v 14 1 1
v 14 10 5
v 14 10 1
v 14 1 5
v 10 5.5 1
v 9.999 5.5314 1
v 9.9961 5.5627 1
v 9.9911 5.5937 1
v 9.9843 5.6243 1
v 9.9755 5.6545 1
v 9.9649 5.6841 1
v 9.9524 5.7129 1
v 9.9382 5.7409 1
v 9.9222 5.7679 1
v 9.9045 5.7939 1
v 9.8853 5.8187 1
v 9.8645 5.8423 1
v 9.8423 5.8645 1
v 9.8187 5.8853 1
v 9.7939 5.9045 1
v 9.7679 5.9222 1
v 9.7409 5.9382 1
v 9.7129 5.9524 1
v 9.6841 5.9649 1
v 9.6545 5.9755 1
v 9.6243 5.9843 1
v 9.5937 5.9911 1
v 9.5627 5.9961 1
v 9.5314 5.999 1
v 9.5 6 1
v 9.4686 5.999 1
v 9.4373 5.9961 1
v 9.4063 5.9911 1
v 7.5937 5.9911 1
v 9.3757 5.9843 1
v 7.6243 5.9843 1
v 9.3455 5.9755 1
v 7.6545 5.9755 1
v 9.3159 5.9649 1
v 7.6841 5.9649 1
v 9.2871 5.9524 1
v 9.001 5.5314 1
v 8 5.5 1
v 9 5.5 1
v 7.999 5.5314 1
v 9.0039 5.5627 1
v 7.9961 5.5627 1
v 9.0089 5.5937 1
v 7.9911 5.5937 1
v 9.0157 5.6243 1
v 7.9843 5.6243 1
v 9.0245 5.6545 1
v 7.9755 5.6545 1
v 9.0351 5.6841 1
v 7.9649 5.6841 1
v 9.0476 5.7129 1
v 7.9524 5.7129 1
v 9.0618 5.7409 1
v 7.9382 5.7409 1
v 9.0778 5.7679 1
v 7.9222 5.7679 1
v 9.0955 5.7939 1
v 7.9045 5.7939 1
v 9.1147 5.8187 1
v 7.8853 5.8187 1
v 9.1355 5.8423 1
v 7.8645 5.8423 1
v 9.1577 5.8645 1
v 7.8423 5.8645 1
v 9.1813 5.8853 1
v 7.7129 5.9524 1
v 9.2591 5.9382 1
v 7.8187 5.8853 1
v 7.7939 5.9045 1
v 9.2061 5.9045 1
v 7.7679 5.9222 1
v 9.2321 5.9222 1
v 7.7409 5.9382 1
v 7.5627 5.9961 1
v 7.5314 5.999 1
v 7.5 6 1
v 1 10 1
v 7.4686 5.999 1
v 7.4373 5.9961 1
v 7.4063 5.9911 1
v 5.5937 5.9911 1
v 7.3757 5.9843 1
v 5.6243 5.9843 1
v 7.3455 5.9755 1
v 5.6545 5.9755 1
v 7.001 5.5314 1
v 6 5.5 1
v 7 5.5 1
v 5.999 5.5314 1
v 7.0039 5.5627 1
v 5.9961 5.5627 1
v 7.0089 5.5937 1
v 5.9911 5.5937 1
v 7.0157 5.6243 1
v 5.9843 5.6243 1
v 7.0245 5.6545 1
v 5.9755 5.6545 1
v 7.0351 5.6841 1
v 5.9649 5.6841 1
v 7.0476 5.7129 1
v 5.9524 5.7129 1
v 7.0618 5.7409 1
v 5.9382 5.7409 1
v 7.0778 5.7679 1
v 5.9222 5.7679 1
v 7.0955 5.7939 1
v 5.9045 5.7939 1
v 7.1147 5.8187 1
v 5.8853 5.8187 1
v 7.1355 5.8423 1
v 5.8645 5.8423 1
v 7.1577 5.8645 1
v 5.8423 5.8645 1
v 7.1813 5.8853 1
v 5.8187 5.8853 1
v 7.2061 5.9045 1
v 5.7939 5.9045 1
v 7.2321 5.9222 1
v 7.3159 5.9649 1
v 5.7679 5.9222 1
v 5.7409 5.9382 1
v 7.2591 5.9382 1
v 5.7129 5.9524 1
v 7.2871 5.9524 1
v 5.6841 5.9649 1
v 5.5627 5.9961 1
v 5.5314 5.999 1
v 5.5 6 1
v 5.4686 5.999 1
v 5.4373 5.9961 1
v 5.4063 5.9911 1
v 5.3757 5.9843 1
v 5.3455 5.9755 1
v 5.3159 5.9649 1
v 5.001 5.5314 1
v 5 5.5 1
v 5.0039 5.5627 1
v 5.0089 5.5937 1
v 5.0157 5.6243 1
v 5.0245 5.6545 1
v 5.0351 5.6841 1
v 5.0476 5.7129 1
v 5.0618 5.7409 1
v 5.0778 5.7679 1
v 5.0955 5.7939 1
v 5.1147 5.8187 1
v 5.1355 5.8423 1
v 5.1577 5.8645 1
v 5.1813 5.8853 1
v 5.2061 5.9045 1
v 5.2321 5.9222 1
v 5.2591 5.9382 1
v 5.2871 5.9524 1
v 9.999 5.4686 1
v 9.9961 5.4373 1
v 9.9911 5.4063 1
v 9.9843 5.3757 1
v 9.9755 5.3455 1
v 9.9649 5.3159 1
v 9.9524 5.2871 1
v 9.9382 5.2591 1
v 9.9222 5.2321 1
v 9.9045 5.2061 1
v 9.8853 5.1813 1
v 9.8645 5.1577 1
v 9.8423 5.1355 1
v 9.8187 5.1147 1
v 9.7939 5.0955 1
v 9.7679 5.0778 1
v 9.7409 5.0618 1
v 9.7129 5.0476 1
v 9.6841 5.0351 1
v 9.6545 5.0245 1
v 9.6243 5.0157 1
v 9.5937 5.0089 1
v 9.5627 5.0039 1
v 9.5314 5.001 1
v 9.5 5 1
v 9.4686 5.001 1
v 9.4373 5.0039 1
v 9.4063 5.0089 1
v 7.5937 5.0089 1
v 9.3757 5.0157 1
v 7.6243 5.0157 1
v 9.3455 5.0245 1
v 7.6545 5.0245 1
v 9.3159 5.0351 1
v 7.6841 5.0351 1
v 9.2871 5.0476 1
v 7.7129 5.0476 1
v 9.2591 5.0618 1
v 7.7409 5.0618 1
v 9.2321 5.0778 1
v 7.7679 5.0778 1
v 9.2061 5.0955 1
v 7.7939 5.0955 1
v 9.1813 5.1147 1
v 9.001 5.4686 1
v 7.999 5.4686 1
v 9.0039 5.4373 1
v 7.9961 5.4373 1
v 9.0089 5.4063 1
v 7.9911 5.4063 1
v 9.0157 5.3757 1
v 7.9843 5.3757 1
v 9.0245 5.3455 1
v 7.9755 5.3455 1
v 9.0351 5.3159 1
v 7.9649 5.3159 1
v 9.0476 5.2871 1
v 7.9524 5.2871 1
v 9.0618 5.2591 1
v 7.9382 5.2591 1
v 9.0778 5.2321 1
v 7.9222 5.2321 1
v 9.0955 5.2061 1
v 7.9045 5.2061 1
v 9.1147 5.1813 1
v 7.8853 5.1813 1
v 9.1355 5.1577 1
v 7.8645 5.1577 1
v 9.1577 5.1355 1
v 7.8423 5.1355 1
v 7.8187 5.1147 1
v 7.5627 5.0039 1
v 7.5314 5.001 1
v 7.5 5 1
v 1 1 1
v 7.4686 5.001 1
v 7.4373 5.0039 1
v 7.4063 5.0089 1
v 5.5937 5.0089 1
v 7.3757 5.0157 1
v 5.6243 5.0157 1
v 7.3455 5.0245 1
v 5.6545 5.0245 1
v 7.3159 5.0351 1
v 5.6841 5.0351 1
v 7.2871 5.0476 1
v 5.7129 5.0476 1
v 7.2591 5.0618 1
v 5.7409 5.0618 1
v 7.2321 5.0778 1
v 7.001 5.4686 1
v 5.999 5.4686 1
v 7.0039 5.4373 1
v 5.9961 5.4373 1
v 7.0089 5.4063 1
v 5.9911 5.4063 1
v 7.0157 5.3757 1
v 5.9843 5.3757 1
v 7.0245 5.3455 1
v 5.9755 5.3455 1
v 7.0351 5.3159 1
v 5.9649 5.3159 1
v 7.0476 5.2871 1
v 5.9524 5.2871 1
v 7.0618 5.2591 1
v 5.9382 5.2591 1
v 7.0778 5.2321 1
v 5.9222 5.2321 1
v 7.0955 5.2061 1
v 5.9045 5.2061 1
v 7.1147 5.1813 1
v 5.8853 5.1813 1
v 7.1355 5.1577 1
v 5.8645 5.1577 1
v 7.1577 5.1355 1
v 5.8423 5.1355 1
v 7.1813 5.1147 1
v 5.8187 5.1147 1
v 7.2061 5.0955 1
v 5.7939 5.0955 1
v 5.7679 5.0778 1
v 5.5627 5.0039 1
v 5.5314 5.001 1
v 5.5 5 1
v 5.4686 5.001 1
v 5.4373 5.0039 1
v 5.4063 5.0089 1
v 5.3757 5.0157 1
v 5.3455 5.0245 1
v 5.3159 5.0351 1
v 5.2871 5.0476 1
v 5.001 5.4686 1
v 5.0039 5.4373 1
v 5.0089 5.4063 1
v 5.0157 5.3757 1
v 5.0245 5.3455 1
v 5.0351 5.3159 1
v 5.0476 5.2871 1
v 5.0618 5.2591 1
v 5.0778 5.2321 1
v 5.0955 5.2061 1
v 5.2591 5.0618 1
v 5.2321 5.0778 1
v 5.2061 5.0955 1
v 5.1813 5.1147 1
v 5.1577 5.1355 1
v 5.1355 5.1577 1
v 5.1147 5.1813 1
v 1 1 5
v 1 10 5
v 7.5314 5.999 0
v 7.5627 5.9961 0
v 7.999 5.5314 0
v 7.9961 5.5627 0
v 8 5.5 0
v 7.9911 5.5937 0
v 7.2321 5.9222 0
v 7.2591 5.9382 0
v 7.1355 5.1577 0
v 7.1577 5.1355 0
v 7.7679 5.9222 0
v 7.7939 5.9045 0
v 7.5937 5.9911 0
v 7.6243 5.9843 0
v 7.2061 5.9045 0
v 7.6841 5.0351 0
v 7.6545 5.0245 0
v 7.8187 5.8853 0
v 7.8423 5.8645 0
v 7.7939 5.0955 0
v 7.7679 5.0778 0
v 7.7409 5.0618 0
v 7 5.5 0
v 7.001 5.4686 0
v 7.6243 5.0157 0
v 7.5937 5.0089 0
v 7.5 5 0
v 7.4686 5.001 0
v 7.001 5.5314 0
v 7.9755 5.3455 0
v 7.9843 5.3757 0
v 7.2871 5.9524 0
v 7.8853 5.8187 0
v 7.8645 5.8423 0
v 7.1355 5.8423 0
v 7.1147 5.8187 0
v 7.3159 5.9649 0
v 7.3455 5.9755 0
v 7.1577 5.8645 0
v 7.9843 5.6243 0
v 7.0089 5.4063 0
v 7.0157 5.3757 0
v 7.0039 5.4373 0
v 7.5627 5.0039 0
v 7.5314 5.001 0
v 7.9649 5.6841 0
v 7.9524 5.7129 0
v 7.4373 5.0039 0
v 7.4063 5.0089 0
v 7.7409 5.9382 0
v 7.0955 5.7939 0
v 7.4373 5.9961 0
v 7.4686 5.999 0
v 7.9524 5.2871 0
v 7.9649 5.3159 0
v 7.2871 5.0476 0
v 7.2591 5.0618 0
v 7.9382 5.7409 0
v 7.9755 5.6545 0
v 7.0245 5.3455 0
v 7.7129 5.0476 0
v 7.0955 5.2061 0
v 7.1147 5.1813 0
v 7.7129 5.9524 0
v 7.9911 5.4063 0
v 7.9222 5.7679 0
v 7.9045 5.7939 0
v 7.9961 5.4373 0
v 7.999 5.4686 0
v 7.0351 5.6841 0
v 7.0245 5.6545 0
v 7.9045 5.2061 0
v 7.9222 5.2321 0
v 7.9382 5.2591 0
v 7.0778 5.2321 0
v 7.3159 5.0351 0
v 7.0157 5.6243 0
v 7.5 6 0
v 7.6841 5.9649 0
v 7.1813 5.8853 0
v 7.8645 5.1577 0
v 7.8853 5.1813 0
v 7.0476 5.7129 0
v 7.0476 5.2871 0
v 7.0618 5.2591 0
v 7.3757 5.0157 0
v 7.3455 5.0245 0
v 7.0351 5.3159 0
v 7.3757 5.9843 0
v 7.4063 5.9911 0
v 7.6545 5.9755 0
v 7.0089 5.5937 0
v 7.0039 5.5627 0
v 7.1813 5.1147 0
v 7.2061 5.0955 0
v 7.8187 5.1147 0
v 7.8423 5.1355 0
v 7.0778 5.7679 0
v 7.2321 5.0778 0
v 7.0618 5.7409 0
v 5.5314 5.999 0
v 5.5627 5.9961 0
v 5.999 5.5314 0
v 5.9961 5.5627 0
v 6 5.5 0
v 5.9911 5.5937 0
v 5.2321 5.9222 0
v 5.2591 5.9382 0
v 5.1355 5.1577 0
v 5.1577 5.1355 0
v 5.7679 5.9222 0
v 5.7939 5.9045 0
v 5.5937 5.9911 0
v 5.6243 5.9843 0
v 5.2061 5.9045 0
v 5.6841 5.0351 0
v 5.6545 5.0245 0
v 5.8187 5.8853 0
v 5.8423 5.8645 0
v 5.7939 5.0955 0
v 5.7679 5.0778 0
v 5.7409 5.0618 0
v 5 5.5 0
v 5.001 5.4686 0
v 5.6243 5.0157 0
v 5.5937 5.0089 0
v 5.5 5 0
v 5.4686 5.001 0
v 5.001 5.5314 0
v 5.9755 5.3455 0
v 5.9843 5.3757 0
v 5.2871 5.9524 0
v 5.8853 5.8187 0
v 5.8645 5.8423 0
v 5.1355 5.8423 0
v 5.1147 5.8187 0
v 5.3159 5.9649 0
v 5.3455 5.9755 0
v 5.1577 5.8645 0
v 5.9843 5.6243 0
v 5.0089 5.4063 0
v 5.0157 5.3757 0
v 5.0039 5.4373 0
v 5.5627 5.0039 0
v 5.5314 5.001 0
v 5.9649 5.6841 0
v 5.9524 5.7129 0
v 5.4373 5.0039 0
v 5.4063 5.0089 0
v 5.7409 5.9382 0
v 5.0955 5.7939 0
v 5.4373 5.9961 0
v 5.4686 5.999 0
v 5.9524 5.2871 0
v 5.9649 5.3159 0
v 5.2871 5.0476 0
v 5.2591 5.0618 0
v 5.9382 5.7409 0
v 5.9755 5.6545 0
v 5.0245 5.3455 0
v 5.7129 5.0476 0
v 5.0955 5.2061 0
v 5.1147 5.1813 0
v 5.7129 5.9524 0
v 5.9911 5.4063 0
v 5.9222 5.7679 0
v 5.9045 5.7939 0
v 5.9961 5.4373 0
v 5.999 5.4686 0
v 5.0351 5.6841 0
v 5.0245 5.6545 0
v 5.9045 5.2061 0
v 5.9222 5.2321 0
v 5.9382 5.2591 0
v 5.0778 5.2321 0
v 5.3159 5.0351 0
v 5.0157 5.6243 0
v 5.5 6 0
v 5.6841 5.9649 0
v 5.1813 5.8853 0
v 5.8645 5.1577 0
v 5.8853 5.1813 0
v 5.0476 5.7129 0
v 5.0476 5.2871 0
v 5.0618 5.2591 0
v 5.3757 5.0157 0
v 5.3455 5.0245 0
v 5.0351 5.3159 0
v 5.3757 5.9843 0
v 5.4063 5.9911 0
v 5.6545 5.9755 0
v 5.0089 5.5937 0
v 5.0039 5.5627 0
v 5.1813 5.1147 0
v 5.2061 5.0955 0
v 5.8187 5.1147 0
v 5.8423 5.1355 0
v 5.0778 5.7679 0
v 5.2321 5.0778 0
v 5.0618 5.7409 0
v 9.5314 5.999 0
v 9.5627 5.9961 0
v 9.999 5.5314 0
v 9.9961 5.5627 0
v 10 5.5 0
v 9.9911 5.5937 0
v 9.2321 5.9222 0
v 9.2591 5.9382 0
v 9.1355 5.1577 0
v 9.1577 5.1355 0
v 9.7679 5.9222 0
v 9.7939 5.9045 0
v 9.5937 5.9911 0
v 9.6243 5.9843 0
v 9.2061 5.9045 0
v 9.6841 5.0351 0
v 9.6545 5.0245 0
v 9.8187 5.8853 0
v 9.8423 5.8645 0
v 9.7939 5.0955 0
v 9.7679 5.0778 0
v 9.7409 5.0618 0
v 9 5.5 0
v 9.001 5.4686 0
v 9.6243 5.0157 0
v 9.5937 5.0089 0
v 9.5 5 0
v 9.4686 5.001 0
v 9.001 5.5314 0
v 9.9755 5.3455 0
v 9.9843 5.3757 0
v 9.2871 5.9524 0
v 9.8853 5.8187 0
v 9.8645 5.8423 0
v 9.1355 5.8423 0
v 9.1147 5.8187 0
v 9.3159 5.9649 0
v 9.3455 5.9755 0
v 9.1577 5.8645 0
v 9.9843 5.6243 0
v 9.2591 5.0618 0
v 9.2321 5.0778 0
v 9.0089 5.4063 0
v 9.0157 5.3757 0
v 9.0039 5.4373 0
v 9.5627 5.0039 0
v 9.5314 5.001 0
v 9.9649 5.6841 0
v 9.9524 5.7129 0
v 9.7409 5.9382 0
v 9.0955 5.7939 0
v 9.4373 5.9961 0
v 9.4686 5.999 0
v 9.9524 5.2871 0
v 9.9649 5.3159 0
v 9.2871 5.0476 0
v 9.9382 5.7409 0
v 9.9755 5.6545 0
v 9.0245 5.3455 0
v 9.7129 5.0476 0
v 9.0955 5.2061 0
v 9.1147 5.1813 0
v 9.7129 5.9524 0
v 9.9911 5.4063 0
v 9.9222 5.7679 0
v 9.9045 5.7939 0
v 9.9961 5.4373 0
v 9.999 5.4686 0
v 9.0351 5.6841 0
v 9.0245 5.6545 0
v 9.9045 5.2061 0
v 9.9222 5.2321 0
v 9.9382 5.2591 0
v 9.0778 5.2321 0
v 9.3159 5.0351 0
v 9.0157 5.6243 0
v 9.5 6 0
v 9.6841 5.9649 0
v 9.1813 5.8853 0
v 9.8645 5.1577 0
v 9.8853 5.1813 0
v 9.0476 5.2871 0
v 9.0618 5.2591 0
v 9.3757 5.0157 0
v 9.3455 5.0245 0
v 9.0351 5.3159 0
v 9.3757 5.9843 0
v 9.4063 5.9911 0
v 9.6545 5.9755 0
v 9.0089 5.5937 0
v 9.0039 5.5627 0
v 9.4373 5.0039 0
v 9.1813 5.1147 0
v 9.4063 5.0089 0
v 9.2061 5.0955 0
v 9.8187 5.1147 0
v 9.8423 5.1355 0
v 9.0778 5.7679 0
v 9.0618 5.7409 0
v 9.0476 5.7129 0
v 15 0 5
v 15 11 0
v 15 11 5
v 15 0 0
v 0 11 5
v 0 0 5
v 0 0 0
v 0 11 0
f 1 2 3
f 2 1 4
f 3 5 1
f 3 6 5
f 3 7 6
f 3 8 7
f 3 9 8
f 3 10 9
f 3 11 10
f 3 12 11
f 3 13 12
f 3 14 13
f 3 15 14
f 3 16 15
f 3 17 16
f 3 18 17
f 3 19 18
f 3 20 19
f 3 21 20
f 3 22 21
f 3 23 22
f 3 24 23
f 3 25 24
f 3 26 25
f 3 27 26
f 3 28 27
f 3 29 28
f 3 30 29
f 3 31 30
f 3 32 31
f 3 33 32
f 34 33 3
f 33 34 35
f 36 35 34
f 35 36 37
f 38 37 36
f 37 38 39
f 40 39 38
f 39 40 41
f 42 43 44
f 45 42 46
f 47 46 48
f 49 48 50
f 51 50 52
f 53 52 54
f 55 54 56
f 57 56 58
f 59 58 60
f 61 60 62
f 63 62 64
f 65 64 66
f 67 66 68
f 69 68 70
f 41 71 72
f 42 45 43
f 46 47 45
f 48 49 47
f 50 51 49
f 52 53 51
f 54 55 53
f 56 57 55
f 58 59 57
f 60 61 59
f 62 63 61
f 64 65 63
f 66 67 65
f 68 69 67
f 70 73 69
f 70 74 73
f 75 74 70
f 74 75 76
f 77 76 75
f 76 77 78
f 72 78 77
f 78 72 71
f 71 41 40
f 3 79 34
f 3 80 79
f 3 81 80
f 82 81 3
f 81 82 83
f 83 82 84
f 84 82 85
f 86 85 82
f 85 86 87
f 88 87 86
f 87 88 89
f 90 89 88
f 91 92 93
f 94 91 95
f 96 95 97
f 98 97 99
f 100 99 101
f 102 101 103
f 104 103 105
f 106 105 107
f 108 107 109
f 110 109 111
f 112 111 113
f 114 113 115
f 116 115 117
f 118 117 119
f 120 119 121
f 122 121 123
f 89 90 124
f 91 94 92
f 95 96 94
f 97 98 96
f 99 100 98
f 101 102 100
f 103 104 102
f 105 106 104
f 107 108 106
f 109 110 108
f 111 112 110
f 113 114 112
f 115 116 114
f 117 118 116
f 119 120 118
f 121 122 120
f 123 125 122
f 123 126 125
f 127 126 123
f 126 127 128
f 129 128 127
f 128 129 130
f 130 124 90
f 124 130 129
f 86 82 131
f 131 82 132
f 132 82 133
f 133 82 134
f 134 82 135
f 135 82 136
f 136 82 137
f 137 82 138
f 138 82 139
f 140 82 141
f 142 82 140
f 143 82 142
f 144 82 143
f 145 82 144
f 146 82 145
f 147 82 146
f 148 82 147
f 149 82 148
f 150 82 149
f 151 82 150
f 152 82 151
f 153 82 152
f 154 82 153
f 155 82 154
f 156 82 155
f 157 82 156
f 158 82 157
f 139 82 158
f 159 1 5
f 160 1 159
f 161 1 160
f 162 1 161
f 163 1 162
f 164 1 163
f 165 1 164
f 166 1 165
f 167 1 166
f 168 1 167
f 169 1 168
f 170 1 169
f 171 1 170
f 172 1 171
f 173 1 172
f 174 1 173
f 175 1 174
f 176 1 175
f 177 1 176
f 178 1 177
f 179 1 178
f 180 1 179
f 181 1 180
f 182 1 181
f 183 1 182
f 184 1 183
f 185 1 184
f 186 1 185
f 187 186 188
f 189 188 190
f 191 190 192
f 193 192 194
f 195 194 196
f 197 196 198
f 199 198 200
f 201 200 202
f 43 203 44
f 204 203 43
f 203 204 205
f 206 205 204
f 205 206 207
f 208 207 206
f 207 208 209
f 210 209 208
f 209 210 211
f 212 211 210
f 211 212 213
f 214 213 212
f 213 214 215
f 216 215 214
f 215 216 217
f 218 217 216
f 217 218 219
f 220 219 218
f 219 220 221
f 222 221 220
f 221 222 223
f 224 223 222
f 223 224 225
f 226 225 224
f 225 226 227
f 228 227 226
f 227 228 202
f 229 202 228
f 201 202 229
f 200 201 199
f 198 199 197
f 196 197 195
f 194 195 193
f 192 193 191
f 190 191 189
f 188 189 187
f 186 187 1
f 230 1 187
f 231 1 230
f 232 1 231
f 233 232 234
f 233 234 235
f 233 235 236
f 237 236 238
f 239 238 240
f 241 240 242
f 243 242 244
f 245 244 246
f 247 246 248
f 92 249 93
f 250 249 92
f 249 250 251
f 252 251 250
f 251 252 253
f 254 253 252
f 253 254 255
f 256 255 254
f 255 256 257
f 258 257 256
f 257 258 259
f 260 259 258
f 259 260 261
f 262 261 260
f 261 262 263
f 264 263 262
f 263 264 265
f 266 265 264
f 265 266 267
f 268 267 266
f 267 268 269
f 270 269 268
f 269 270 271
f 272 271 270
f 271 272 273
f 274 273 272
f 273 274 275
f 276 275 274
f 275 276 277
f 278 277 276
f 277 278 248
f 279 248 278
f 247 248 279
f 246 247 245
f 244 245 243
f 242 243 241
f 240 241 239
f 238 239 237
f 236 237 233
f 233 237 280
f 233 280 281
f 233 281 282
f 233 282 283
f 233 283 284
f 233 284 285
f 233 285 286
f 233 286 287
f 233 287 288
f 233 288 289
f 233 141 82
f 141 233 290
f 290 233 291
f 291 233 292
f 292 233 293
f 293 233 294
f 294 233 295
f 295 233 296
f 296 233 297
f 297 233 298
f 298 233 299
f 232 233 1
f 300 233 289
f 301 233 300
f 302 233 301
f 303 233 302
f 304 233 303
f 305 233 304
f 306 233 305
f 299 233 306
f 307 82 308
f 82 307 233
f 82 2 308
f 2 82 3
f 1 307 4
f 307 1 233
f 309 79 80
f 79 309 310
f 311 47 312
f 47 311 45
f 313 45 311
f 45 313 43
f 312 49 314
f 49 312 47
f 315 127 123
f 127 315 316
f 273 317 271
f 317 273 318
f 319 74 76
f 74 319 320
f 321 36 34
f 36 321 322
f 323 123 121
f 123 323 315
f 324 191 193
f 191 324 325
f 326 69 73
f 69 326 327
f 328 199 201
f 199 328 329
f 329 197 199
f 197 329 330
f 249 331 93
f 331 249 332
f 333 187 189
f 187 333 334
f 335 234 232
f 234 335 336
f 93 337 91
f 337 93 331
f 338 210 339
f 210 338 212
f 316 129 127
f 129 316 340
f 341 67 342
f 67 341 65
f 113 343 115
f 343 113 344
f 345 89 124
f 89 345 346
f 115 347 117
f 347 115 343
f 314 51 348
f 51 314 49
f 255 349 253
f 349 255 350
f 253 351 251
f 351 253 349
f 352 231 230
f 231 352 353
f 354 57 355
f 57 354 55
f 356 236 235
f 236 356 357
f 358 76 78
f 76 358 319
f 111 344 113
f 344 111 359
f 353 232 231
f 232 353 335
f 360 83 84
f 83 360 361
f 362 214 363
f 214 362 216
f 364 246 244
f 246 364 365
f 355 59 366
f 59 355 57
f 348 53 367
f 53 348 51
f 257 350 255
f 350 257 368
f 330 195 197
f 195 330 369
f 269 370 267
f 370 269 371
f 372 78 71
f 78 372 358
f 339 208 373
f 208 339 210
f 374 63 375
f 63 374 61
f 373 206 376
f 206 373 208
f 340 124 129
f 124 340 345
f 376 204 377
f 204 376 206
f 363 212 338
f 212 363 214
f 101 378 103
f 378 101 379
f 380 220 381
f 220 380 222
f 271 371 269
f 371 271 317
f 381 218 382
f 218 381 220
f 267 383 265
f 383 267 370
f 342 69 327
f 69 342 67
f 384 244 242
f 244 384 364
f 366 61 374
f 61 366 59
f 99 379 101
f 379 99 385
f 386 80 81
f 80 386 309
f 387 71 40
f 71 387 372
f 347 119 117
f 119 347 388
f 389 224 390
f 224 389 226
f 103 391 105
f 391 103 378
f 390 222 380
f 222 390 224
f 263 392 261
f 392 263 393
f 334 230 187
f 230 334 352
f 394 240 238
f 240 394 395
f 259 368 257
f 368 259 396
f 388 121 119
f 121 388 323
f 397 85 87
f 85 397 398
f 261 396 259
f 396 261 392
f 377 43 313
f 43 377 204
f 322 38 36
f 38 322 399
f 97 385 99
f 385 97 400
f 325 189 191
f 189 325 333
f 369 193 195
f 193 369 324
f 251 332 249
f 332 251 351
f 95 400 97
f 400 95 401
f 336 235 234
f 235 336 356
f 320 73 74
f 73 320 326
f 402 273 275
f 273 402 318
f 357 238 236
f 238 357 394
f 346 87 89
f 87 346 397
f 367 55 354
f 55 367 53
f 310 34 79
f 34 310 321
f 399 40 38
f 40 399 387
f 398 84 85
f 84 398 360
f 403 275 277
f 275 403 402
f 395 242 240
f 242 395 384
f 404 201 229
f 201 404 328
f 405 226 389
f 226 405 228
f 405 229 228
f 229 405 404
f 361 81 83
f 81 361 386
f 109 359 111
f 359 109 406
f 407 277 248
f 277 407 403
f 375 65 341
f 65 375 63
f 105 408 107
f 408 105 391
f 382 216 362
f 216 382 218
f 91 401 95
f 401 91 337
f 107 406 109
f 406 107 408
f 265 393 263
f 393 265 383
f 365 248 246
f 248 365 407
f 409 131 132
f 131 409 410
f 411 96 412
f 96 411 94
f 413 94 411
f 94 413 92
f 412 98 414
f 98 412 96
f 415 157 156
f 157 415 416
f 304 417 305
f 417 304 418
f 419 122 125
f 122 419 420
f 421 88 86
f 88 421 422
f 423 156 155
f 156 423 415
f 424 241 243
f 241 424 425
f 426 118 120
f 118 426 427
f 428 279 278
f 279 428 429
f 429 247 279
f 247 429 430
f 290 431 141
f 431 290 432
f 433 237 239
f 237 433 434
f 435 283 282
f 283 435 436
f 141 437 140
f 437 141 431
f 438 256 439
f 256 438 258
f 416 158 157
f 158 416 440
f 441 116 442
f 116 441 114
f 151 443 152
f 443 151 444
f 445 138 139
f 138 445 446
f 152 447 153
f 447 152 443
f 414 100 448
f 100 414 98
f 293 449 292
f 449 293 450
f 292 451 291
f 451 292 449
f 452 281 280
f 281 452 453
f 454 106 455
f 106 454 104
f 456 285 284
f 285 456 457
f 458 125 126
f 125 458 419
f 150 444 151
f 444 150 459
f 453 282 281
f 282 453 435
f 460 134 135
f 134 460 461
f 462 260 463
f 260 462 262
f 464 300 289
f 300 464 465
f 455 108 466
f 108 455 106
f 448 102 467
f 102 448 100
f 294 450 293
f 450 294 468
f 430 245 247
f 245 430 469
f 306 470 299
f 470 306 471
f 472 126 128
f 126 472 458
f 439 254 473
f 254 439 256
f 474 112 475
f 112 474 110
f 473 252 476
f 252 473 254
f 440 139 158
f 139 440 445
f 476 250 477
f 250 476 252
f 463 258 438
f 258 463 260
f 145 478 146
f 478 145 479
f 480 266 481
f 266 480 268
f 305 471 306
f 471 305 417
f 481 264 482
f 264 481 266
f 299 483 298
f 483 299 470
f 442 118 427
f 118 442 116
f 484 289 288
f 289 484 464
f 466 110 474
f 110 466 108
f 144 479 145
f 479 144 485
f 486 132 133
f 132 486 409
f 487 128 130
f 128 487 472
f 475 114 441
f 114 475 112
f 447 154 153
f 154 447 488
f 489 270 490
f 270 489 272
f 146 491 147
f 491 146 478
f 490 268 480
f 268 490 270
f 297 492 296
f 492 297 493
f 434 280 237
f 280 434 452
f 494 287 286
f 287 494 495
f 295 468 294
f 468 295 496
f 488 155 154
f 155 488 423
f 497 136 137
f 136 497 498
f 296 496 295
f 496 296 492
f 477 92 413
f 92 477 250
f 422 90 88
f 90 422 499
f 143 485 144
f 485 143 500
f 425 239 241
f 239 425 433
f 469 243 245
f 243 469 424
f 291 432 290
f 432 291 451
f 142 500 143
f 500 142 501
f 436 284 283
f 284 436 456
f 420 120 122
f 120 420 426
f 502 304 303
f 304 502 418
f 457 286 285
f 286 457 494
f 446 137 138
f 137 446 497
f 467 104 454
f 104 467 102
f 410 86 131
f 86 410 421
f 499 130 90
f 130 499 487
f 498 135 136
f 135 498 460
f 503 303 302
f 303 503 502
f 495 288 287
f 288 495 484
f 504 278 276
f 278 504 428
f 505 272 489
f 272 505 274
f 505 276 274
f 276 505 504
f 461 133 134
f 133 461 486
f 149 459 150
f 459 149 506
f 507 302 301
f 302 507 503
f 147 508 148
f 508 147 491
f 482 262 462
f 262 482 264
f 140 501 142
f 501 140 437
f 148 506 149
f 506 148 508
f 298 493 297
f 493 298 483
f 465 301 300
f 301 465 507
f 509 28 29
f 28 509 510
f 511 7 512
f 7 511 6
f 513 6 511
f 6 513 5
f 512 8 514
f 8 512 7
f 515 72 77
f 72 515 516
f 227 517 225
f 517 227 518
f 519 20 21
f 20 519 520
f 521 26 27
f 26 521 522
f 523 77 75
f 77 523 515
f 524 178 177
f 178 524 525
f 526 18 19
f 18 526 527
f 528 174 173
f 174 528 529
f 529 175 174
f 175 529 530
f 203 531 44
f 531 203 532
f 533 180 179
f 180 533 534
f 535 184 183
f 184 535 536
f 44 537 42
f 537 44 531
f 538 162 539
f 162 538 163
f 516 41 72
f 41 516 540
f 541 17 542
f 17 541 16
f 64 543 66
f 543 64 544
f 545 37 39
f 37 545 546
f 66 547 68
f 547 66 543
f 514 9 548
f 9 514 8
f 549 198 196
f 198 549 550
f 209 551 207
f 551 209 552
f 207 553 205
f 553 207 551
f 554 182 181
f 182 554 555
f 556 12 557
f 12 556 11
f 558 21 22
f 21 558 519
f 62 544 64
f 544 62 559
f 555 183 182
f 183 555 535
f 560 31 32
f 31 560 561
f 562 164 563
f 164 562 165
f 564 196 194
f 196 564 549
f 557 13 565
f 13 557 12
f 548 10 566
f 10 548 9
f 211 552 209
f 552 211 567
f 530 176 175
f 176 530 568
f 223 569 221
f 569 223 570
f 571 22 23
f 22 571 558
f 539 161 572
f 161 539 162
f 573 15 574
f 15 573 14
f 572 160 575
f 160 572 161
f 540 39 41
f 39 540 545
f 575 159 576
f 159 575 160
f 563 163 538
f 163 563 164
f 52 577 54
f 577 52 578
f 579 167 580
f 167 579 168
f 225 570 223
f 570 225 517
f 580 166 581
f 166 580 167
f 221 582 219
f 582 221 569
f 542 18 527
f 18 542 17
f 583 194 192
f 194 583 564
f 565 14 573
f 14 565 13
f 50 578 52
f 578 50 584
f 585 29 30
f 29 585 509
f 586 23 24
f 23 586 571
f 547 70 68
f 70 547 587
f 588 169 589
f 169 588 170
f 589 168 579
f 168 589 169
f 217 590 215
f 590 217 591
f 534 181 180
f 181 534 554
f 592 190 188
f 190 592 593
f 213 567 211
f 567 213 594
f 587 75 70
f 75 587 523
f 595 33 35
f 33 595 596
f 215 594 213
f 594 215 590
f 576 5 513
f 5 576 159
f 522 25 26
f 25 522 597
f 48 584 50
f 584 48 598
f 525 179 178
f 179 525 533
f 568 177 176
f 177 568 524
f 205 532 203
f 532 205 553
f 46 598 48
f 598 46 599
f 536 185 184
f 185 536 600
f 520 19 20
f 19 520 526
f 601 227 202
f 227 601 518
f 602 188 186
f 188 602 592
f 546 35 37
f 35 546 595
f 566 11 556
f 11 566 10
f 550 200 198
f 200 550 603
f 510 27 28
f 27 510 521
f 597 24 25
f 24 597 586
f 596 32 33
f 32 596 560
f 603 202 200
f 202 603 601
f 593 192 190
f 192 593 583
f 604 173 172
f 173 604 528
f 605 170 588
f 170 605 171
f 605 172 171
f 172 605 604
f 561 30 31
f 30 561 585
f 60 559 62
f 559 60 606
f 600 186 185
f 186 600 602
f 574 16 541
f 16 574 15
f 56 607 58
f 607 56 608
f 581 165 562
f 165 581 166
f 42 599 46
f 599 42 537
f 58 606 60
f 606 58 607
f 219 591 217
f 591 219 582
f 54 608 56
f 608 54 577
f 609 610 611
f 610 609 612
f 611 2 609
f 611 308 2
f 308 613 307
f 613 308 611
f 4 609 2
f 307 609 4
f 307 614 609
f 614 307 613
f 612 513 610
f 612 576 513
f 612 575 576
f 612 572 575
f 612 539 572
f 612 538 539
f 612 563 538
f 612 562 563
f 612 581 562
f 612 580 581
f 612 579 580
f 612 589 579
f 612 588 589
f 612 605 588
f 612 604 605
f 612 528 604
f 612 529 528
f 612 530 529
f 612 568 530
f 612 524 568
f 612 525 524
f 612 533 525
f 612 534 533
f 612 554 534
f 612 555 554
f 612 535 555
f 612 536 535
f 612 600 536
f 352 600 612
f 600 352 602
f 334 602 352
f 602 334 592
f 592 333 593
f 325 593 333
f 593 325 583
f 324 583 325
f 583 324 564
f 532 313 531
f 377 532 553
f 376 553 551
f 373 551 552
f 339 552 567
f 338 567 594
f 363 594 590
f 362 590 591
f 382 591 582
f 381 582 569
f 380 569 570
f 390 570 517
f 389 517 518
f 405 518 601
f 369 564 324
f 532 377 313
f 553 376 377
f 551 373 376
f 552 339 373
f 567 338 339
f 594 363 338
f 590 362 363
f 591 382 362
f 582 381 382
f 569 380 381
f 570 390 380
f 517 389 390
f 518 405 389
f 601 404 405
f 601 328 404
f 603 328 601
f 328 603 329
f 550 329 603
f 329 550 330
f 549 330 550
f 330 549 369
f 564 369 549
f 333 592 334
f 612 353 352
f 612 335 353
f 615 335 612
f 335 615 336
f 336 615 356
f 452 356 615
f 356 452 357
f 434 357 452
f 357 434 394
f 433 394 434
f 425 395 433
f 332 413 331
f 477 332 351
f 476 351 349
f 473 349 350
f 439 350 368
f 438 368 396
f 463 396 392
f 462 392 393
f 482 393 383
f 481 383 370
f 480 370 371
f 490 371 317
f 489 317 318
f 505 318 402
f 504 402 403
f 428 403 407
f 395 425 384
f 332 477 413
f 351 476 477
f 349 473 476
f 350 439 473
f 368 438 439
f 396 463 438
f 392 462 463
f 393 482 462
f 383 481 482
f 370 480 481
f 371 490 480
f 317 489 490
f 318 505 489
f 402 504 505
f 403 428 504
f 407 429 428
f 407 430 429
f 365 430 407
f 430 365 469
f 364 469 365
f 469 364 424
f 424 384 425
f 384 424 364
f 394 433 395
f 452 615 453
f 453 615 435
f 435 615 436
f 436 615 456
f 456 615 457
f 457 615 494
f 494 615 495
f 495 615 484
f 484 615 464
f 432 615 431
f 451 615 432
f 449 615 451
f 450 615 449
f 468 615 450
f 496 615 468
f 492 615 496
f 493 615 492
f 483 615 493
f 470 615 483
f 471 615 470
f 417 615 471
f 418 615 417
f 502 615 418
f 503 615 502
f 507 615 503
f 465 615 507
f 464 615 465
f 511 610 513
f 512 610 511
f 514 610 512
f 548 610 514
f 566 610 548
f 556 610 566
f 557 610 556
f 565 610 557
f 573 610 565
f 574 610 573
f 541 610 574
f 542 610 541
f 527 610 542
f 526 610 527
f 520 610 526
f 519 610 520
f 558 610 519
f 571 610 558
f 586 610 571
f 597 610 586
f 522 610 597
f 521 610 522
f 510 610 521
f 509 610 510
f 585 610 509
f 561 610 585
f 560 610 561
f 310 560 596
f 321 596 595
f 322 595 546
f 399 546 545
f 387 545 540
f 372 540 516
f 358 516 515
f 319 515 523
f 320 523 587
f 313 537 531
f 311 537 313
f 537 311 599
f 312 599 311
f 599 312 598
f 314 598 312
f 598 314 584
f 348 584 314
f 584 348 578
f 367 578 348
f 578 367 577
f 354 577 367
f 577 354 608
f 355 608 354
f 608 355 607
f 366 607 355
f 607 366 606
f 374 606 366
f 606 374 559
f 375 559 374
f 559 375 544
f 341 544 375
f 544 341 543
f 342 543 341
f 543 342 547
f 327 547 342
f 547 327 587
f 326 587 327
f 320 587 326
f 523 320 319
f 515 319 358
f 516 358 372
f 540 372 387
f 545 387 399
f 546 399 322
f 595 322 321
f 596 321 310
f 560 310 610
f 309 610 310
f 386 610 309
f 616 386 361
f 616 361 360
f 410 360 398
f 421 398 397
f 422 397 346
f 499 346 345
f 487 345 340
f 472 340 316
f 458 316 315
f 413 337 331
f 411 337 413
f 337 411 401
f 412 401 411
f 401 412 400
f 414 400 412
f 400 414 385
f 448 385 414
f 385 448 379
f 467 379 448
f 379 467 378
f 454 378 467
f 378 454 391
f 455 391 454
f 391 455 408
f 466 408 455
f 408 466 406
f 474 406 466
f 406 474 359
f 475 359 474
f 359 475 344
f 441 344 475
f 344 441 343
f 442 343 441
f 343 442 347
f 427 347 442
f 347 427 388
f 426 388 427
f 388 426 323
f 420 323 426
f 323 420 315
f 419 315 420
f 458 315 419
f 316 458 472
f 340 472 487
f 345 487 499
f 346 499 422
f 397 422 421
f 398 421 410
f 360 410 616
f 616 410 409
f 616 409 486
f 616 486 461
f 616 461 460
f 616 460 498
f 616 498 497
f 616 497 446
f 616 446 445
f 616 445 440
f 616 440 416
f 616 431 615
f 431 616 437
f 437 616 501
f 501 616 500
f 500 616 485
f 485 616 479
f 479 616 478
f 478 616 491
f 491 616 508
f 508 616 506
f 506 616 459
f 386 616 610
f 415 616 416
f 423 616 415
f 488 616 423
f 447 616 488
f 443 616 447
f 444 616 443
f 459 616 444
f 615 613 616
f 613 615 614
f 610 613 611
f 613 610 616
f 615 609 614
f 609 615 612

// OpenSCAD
$ht=5;

color("yellow")
  //translate([0, 0, 0])
//   difference() {
 //  translate([0,0,0]) cube([15,11,$ht], center=false);
 //  
 //      union() {
//         translate([10,1,8]) { cube([13,9,$ht+4], center=false); }
//        translate([7.5,5.5,-1]) cylinder(h = 4, r=0.5, center = false, $fn=100);
 //       translate([5.5,5.5,-1]) cylinder(h = 4, r=0.5, center = false, $fn=100);
 //       translate([9.5,5.5,-1]) cylinder(h = 4, r=0.5, center = false, $fn=100);
 //       translate(0,0,-1)
 //       linear_extrude(height=9)
 //         square([13,9], center=true)
 //     }
      //linear_extrude(height=10) translate([0,0,0]) square([15,11], center=false);
  //  }
            
         
//   difference() {cube(12,center=true); cube(8, center=false); }   
            
 difference() {
   cube([15,11,$ht], center=false);
   union() {
     translate([1,1,1]) { cube([13,9,$ht+4], center=false); }
     translate([7.5,5.5,-1]) cylinder(h = 4, r=0.5, center = false, $fn=100);
     translate([5.5,5.5,-1]) cylinder(h = 4, r=0.5, center = false, $fn=100);
     translate([9.5,5.5,-1]) cylinder(h = 4, r=0.5, center = false, $fn=100);
     
   }
 }   
